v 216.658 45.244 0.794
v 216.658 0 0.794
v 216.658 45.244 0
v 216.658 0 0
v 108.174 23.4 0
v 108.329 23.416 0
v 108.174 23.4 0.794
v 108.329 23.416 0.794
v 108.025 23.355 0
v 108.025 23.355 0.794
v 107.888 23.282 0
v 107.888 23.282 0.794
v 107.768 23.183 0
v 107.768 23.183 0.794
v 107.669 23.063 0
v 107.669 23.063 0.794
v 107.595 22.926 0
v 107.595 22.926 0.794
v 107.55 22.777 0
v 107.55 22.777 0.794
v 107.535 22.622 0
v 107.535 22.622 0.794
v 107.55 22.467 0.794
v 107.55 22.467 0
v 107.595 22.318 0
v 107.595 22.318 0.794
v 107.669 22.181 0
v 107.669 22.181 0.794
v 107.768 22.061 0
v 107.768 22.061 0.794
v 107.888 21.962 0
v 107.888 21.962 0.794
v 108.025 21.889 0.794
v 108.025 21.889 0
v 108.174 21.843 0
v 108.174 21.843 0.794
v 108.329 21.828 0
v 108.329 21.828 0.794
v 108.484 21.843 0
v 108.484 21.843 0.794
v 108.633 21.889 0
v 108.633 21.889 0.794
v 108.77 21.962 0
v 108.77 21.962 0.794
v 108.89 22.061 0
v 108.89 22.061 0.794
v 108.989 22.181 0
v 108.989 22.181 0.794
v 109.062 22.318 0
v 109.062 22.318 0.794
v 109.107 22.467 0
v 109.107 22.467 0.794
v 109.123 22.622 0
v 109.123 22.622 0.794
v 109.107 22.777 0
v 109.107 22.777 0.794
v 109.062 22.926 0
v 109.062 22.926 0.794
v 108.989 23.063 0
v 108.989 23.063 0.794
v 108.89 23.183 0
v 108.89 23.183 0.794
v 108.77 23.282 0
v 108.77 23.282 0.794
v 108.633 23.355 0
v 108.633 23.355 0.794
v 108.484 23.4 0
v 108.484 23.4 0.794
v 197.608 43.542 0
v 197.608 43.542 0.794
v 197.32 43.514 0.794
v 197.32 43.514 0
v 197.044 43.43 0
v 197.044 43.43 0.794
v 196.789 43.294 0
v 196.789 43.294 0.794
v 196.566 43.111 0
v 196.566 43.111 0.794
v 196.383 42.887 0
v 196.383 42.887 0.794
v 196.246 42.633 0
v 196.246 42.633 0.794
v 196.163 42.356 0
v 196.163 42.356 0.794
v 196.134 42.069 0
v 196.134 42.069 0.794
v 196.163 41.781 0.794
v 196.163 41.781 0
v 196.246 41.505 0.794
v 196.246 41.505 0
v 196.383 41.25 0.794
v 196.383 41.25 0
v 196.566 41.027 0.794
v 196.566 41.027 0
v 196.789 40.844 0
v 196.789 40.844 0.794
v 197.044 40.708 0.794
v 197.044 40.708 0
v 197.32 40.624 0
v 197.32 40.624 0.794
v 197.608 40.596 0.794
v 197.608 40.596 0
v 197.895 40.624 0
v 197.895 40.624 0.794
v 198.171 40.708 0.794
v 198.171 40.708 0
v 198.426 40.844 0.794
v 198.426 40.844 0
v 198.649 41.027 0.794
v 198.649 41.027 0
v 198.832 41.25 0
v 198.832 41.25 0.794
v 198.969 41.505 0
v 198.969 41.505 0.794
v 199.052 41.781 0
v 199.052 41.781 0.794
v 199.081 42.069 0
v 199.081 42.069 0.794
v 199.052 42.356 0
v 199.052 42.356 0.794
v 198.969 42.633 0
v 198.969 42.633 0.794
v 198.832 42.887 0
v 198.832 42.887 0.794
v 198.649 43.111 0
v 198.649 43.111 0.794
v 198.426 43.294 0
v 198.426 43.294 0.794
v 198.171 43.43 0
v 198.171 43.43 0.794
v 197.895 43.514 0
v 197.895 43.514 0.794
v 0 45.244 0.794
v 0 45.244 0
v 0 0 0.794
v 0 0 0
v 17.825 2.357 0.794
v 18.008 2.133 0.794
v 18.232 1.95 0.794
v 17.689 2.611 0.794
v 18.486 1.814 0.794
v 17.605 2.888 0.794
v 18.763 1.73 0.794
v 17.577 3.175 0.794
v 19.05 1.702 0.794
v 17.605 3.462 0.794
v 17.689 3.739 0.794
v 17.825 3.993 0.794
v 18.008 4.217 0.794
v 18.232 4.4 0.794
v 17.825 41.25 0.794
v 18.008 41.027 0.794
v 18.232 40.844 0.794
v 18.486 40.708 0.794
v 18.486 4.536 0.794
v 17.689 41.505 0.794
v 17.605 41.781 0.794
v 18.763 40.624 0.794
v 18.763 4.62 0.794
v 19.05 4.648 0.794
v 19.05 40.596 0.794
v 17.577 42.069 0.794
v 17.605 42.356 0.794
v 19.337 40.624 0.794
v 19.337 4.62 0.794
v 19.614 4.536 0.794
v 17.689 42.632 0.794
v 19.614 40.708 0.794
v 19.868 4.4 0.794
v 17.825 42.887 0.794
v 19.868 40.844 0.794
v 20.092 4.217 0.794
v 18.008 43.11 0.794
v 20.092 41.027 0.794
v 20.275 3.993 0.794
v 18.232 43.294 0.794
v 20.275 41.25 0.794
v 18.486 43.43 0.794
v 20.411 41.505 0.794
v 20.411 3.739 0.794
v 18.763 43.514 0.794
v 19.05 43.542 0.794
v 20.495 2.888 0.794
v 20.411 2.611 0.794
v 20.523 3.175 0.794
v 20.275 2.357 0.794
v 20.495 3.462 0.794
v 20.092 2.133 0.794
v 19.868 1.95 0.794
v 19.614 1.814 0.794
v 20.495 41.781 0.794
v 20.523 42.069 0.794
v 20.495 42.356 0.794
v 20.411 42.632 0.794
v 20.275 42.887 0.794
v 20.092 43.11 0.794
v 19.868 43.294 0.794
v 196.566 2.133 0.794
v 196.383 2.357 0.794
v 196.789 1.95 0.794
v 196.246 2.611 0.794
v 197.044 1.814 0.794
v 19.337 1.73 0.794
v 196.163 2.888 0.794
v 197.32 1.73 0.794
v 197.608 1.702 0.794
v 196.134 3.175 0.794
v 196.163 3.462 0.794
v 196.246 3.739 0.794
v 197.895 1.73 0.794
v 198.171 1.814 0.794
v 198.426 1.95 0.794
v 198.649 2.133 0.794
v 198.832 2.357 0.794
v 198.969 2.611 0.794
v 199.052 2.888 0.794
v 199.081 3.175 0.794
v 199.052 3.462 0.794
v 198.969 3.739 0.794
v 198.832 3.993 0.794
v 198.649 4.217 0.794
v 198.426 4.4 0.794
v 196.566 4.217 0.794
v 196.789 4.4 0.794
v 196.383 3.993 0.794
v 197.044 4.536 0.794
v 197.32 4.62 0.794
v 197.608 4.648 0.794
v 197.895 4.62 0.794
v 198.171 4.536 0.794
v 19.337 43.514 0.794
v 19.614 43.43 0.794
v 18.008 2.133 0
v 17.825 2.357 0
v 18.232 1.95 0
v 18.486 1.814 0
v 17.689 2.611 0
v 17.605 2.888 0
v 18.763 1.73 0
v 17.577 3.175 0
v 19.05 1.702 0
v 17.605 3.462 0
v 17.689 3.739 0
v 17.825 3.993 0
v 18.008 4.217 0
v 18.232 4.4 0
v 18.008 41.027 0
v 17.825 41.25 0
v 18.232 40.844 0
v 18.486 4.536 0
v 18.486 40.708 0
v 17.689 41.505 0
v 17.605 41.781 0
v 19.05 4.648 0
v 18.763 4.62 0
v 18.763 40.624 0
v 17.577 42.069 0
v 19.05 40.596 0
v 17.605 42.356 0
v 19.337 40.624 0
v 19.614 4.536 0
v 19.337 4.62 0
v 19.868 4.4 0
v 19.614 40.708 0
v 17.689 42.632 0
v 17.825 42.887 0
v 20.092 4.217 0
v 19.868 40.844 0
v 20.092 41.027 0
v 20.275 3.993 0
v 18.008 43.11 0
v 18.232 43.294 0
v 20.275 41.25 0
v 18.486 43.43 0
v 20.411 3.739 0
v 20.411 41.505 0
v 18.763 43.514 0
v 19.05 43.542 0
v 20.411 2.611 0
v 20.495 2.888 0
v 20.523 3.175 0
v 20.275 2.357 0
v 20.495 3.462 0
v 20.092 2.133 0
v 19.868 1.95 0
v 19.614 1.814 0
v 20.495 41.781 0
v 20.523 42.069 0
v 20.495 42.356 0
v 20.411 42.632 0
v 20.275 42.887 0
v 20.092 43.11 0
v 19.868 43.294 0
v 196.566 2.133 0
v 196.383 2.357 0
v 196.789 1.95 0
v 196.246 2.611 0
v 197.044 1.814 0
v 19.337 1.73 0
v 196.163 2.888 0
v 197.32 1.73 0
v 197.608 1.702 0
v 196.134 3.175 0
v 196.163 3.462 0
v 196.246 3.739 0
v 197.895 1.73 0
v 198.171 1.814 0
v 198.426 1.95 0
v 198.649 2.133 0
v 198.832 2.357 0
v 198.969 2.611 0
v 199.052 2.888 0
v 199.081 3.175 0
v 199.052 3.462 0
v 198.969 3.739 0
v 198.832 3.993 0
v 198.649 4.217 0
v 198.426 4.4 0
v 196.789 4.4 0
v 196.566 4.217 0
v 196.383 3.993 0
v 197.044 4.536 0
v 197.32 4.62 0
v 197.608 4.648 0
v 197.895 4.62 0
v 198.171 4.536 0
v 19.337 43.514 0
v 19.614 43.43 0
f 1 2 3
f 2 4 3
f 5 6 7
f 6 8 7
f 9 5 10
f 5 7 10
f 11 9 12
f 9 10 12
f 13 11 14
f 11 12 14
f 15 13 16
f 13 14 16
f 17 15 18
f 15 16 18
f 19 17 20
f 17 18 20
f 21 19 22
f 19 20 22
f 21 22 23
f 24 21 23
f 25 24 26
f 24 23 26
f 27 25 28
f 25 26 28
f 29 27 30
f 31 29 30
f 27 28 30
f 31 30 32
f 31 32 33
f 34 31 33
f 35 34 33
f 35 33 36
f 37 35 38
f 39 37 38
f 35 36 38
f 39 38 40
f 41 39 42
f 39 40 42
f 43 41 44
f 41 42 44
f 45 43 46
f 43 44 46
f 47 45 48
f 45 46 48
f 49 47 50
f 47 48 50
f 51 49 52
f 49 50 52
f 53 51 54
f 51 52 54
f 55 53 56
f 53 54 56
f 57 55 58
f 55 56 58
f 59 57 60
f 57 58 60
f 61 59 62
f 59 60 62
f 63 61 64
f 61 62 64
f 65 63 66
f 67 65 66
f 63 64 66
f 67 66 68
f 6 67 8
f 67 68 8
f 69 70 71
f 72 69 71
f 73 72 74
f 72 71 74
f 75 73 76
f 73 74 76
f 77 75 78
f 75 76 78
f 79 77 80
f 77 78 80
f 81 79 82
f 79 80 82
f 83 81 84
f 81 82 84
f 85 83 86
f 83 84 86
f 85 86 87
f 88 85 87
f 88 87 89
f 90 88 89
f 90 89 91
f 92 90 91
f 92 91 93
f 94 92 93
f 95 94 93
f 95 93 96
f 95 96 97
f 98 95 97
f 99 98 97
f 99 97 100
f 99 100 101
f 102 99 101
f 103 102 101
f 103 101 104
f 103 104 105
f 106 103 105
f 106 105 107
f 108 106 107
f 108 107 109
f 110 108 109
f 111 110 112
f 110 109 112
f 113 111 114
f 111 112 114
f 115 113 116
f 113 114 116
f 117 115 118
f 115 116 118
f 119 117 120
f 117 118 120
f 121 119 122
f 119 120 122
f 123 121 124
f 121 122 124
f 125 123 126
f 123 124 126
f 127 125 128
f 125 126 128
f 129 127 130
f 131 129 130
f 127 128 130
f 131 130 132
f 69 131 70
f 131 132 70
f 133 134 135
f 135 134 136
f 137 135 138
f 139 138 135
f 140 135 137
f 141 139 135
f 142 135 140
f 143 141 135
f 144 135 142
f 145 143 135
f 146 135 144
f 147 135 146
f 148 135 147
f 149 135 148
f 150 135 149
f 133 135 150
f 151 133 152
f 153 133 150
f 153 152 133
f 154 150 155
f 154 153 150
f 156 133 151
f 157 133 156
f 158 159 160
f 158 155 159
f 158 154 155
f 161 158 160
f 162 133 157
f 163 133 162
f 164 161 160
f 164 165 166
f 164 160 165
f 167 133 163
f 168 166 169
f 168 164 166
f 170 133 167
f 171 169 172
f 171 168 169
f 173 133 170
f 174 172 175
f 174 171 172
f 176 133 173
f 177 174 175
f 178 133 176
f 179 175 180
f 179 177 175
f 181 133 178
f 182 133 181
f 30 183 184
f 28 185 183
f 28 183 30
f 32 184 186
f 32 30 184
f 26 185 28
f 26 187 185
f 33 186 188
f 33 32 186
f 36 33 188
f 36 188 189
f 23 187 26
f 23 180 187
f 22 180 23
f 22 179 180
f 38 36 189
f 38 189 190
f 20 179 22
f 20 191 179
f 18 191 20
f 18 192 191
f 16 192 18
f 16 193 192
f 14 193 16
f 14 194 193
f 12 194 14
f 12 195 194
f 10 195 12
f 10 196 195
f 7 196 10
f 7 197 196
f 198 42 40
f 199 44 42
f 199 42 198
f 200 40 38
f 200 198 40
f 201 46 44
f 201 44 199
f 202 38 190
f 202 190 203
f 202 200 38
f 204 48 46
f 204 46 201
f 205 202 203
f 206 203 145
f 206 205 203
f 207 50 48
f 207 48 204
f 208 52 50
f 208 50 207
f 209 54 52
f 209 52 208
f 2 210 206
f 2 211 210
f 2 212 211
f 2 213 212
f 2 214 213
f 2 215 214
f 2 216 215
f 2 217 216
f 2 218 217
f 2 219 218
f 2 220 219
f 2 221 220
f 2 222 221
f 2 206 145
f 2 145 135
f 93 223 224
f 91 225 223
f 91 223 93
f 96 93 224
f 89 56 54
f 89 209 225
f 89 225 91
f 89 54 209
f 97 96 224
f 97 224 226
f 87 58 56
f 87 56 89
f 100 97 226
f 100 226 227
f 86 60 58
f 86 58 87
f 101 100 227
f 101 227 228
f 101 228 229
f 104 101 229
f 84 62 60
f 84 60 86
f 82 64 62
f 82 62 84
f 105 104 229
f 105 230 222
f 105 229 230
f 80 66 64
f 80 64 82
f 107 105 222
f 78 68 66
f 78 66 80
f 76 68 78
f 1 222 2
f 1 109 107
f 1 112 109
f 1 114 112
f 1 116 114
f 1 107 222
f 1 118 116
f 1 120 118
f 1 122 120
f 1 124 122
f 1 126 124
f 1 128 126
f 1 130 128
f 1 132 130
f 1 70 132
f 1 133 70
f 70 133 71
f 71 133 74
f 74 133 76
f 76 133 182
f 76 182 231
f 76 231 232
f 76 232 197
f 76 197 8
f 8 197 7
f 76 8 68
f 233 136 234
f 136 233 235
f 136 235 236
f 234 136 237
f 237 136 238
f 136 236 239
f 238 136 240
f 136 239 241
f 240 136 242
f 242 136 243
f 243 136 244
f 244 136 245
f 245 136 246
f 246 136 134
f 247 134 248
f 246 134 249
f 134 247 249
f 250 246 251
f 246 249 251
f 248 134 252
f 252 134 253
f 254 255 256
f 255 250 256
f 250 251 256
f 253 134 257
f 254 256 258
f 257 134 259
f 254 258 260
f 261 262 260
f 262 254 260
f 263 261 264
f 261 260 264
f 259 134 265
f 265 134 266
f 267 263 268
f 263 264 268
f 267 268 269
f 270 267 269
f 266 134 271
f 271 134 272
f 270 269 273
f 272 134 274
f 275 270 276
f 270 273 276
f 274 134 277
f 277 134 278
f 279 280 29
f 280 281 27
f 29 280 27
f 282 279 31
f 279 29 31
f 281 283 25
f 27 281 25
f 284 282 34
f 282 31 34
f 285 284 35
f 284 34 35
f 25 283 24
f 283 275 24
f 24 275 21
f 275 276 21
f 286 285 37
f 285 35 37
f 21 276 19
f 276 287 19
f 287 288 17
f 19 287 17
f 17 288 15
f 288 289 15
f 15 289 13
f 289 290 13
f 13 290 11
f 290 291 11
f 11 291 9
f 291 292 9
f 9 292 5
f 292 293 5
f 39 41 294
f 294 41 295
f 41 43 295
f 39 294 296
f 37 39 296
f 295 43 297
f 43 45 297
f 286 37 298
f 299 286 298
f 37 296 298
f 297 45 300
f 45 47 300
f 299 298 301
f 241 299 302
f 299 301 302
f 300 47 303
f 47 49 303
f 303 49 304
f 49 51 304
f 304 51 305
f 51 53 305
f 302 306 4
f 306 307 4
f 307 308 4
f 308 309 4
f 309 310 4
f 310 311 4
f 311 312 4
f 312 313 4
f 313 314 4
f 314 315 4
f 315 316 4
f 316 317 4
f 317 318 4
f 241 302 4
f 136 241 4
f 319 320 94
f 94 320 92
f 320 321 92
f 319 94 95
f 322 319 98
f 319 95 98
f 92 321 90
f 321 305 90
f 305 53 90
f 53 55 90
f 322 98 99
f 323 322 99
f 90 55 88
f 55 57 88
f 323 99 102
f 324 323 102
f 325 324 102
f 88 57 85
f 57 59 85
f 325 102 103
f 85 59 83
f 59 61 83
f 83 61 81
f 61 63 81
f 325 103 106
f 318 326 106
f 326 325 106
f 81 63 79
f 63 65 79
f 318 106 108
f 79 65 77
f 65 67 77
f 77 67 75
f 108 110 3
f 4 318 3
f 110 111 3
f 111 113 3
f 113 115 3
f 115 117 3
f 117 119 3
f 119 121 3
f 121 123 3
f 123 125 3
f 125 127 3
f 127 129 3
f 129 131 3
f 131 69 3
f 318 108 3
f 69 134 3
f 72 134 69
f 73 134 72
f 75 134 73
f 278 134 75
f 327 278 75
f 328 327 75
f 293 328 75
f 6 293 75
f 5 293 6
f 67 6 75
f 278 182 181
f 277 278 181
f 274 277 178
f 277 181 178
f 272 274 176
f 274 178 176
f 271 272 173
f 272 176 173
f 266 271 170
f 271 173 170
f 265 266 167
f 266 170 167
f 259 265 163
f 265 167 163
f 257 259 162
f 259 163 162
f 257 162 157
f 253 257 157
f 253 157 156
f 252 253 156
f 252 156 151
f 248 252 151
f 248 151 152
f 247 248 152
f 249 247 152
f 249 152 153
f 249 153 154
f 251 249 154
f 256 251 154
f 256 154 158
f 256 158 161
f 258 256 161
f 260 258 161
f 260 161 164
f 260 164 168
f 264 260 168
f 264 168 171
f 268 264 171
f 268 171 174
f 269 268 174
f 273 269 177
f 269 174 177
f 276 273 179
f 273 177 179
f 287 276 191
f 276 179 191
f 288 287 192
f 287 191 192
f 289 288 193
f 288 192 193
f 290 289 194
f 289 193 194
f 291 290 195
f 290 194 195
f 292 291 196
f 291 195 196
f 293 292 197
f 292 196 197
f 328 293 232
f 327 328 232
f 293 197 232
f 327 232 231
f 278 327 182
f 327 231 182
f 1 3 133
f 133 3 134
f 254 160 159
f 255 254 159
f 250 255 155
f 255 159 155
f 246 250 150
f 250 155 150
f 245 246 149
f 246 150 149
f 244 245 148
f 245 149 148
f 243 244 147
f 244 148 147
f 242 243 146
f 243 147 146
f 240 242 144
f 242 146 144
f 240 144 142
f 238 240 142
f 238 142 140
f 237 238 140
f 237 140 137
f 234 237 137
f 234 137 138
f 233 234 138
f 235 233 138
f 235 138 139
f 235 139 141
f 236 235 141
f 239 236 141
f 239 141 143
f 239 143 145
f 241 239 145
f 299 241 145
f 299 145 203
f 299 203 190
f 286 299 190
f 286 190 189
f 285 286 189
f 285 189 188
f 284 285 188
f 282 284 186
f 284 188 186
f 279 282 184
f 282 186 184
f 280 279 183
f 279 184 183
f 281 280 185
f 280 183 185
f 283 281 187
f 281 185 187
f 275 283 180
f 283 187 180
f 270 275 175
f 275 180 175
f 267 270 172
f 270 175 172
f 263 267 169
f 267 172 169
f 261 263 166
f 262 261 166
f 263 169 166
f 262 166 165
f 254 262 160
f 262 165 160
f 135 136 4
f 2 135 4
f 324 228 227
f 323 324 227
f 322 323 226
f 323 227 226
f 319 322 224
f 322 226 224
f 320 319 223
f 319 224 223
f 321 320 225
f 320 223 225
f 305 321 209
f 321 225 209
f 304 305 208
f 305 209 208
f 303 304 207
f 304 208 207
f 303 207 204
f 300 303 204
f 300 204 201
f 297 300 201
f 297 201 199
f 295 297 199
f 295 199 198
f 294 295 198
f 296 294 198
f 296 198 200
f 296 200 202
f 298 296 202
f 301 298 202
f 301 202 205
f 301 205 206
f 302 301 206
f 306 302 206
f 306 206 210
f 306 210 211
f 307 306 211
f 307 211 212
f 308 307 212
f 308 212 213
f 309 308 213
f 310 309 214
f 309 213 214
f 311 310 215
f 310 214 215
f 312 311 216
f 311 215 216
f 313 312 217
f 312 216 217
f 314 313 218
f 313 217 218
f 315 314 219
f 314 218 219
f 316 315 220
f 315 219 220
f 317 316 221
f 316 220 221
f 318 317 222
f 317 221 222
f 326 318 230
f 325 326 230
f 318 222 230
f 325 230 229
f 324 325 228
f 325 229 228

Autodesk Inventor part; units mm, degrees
ref_plane "YZ Plane" through (0, 0, 0) normal (1, 0, 0) x (0, 1, 0)
ref_plane "XZ Plane" through (0, 0, 0) normal (0, 1, 0) x (-1, 0, 0)
ref_plane "XY Plane" through (0, 0, 0) normal (0, 0, 1) x (1, 0, 0)
sketch "Sketch1" plane through (0, 0, 0) normal (0, 0, 1) x (1, 0, 0)
  line L0 (0, 0) -> (216.6575, 0)
  line L1 (216.6575, 0) -> (216.6575, 45.2438)
  line L2 (216.6575, 45.2438) -> (0, 45.2437)
  line L3 (0, 45.2437) -> (0, 0)
  dimension "d0" = 216.6575
  dimension "d1" = 45.2437
extrude "Plate1" add sketch "Sketch1" along normal blind 0.7937
sketch "Sketch2" plane through (0, 0, 0) normal (0, 0, -1) x (-1, 0, 0)
  line L0 (0, 0) -> (-216.6575, 0) projected
  line L1 (0, 45.2437) -> (0, 0) projected
  line L2 (-216.6575, 45.2438) -> (0, 45.2437) projected
  line L3 (-216.6575, 0) -> (-216.6575, 45.2438) projected
  line L4 (-197.6075, 45.2438) -> (-197.6075, 0) construction
  line L5 (-216.6575, 3.175) -> (0, 3.175) construction
  line L6 (-19.05, 0) -> (-19.05, 45.2437) construction
  line L7 (0, 42.0687) -> (-216.6575, 42.0688) construction
  point P0 (-197.6075, 42.0688)
  point P1 (-197.6075, 3.175)
  point P2 (-19.05, 3.175)
  point P3 (-19.05, 42.0687)
  point P4 (-108.3288, 22.6219)
  dimension "d3" = 3.175
  dimension "d4" = 3.175
  dimension "d5" = 19.05
  dimension "d6" = 19.05
  dimension "d7" = 22.6219
  dimension "d8" = 108.3288
  dimension "d9" = 45.2437
  dimension "d10" = 216.6575
hole "Hole1" at (197.6075, 42.0688, 0) at (197.6075, 3.175, 0) at (19.05, 3.175, 0) at (19.05, 42.0687, 0) direction (0, 0, 1) diameter 2.9464 end through all clearance for "Flat Head Machine Screw (82)" size "#4" standard "Ansi Unified Screw Threads"
hole "Hole2" at (108.3288, 22.6219, 0) direction (0, 0, 1) diameter 1.5875 end through all
equation "\"d4\" = d3"
equation "\"d6\" = d5"
equation "\"d7\" = 0.5 * d9"
equation "\"d8\" = 0.5 * d10"
equation "\"d16\" = Thickness"
equation "\"d23\" = Thickness"
equation "\"BendRadius\" = Thickness"
equation "\"BendReliefWidth\" = Thickness"
equation "\"BendReliefDepth\" = 0.5 * Thickness"
equation "\"CornerReliefSize\" = 4 * Thickness"
equation "\"MinimumRemnant\" = 2 * Thickness"
equation "\"TransitionRadius\" = BendRadius"
equation "\"JacobiRadiusSize\" = BendRadius"
equation "\"GapSize\" = Thickness"
equation "\"d2\" = BendRadius"
equation "\"Thickness\" = 0.79375"
properties part number "Sheild Flat" material "Aluminum 6061"
